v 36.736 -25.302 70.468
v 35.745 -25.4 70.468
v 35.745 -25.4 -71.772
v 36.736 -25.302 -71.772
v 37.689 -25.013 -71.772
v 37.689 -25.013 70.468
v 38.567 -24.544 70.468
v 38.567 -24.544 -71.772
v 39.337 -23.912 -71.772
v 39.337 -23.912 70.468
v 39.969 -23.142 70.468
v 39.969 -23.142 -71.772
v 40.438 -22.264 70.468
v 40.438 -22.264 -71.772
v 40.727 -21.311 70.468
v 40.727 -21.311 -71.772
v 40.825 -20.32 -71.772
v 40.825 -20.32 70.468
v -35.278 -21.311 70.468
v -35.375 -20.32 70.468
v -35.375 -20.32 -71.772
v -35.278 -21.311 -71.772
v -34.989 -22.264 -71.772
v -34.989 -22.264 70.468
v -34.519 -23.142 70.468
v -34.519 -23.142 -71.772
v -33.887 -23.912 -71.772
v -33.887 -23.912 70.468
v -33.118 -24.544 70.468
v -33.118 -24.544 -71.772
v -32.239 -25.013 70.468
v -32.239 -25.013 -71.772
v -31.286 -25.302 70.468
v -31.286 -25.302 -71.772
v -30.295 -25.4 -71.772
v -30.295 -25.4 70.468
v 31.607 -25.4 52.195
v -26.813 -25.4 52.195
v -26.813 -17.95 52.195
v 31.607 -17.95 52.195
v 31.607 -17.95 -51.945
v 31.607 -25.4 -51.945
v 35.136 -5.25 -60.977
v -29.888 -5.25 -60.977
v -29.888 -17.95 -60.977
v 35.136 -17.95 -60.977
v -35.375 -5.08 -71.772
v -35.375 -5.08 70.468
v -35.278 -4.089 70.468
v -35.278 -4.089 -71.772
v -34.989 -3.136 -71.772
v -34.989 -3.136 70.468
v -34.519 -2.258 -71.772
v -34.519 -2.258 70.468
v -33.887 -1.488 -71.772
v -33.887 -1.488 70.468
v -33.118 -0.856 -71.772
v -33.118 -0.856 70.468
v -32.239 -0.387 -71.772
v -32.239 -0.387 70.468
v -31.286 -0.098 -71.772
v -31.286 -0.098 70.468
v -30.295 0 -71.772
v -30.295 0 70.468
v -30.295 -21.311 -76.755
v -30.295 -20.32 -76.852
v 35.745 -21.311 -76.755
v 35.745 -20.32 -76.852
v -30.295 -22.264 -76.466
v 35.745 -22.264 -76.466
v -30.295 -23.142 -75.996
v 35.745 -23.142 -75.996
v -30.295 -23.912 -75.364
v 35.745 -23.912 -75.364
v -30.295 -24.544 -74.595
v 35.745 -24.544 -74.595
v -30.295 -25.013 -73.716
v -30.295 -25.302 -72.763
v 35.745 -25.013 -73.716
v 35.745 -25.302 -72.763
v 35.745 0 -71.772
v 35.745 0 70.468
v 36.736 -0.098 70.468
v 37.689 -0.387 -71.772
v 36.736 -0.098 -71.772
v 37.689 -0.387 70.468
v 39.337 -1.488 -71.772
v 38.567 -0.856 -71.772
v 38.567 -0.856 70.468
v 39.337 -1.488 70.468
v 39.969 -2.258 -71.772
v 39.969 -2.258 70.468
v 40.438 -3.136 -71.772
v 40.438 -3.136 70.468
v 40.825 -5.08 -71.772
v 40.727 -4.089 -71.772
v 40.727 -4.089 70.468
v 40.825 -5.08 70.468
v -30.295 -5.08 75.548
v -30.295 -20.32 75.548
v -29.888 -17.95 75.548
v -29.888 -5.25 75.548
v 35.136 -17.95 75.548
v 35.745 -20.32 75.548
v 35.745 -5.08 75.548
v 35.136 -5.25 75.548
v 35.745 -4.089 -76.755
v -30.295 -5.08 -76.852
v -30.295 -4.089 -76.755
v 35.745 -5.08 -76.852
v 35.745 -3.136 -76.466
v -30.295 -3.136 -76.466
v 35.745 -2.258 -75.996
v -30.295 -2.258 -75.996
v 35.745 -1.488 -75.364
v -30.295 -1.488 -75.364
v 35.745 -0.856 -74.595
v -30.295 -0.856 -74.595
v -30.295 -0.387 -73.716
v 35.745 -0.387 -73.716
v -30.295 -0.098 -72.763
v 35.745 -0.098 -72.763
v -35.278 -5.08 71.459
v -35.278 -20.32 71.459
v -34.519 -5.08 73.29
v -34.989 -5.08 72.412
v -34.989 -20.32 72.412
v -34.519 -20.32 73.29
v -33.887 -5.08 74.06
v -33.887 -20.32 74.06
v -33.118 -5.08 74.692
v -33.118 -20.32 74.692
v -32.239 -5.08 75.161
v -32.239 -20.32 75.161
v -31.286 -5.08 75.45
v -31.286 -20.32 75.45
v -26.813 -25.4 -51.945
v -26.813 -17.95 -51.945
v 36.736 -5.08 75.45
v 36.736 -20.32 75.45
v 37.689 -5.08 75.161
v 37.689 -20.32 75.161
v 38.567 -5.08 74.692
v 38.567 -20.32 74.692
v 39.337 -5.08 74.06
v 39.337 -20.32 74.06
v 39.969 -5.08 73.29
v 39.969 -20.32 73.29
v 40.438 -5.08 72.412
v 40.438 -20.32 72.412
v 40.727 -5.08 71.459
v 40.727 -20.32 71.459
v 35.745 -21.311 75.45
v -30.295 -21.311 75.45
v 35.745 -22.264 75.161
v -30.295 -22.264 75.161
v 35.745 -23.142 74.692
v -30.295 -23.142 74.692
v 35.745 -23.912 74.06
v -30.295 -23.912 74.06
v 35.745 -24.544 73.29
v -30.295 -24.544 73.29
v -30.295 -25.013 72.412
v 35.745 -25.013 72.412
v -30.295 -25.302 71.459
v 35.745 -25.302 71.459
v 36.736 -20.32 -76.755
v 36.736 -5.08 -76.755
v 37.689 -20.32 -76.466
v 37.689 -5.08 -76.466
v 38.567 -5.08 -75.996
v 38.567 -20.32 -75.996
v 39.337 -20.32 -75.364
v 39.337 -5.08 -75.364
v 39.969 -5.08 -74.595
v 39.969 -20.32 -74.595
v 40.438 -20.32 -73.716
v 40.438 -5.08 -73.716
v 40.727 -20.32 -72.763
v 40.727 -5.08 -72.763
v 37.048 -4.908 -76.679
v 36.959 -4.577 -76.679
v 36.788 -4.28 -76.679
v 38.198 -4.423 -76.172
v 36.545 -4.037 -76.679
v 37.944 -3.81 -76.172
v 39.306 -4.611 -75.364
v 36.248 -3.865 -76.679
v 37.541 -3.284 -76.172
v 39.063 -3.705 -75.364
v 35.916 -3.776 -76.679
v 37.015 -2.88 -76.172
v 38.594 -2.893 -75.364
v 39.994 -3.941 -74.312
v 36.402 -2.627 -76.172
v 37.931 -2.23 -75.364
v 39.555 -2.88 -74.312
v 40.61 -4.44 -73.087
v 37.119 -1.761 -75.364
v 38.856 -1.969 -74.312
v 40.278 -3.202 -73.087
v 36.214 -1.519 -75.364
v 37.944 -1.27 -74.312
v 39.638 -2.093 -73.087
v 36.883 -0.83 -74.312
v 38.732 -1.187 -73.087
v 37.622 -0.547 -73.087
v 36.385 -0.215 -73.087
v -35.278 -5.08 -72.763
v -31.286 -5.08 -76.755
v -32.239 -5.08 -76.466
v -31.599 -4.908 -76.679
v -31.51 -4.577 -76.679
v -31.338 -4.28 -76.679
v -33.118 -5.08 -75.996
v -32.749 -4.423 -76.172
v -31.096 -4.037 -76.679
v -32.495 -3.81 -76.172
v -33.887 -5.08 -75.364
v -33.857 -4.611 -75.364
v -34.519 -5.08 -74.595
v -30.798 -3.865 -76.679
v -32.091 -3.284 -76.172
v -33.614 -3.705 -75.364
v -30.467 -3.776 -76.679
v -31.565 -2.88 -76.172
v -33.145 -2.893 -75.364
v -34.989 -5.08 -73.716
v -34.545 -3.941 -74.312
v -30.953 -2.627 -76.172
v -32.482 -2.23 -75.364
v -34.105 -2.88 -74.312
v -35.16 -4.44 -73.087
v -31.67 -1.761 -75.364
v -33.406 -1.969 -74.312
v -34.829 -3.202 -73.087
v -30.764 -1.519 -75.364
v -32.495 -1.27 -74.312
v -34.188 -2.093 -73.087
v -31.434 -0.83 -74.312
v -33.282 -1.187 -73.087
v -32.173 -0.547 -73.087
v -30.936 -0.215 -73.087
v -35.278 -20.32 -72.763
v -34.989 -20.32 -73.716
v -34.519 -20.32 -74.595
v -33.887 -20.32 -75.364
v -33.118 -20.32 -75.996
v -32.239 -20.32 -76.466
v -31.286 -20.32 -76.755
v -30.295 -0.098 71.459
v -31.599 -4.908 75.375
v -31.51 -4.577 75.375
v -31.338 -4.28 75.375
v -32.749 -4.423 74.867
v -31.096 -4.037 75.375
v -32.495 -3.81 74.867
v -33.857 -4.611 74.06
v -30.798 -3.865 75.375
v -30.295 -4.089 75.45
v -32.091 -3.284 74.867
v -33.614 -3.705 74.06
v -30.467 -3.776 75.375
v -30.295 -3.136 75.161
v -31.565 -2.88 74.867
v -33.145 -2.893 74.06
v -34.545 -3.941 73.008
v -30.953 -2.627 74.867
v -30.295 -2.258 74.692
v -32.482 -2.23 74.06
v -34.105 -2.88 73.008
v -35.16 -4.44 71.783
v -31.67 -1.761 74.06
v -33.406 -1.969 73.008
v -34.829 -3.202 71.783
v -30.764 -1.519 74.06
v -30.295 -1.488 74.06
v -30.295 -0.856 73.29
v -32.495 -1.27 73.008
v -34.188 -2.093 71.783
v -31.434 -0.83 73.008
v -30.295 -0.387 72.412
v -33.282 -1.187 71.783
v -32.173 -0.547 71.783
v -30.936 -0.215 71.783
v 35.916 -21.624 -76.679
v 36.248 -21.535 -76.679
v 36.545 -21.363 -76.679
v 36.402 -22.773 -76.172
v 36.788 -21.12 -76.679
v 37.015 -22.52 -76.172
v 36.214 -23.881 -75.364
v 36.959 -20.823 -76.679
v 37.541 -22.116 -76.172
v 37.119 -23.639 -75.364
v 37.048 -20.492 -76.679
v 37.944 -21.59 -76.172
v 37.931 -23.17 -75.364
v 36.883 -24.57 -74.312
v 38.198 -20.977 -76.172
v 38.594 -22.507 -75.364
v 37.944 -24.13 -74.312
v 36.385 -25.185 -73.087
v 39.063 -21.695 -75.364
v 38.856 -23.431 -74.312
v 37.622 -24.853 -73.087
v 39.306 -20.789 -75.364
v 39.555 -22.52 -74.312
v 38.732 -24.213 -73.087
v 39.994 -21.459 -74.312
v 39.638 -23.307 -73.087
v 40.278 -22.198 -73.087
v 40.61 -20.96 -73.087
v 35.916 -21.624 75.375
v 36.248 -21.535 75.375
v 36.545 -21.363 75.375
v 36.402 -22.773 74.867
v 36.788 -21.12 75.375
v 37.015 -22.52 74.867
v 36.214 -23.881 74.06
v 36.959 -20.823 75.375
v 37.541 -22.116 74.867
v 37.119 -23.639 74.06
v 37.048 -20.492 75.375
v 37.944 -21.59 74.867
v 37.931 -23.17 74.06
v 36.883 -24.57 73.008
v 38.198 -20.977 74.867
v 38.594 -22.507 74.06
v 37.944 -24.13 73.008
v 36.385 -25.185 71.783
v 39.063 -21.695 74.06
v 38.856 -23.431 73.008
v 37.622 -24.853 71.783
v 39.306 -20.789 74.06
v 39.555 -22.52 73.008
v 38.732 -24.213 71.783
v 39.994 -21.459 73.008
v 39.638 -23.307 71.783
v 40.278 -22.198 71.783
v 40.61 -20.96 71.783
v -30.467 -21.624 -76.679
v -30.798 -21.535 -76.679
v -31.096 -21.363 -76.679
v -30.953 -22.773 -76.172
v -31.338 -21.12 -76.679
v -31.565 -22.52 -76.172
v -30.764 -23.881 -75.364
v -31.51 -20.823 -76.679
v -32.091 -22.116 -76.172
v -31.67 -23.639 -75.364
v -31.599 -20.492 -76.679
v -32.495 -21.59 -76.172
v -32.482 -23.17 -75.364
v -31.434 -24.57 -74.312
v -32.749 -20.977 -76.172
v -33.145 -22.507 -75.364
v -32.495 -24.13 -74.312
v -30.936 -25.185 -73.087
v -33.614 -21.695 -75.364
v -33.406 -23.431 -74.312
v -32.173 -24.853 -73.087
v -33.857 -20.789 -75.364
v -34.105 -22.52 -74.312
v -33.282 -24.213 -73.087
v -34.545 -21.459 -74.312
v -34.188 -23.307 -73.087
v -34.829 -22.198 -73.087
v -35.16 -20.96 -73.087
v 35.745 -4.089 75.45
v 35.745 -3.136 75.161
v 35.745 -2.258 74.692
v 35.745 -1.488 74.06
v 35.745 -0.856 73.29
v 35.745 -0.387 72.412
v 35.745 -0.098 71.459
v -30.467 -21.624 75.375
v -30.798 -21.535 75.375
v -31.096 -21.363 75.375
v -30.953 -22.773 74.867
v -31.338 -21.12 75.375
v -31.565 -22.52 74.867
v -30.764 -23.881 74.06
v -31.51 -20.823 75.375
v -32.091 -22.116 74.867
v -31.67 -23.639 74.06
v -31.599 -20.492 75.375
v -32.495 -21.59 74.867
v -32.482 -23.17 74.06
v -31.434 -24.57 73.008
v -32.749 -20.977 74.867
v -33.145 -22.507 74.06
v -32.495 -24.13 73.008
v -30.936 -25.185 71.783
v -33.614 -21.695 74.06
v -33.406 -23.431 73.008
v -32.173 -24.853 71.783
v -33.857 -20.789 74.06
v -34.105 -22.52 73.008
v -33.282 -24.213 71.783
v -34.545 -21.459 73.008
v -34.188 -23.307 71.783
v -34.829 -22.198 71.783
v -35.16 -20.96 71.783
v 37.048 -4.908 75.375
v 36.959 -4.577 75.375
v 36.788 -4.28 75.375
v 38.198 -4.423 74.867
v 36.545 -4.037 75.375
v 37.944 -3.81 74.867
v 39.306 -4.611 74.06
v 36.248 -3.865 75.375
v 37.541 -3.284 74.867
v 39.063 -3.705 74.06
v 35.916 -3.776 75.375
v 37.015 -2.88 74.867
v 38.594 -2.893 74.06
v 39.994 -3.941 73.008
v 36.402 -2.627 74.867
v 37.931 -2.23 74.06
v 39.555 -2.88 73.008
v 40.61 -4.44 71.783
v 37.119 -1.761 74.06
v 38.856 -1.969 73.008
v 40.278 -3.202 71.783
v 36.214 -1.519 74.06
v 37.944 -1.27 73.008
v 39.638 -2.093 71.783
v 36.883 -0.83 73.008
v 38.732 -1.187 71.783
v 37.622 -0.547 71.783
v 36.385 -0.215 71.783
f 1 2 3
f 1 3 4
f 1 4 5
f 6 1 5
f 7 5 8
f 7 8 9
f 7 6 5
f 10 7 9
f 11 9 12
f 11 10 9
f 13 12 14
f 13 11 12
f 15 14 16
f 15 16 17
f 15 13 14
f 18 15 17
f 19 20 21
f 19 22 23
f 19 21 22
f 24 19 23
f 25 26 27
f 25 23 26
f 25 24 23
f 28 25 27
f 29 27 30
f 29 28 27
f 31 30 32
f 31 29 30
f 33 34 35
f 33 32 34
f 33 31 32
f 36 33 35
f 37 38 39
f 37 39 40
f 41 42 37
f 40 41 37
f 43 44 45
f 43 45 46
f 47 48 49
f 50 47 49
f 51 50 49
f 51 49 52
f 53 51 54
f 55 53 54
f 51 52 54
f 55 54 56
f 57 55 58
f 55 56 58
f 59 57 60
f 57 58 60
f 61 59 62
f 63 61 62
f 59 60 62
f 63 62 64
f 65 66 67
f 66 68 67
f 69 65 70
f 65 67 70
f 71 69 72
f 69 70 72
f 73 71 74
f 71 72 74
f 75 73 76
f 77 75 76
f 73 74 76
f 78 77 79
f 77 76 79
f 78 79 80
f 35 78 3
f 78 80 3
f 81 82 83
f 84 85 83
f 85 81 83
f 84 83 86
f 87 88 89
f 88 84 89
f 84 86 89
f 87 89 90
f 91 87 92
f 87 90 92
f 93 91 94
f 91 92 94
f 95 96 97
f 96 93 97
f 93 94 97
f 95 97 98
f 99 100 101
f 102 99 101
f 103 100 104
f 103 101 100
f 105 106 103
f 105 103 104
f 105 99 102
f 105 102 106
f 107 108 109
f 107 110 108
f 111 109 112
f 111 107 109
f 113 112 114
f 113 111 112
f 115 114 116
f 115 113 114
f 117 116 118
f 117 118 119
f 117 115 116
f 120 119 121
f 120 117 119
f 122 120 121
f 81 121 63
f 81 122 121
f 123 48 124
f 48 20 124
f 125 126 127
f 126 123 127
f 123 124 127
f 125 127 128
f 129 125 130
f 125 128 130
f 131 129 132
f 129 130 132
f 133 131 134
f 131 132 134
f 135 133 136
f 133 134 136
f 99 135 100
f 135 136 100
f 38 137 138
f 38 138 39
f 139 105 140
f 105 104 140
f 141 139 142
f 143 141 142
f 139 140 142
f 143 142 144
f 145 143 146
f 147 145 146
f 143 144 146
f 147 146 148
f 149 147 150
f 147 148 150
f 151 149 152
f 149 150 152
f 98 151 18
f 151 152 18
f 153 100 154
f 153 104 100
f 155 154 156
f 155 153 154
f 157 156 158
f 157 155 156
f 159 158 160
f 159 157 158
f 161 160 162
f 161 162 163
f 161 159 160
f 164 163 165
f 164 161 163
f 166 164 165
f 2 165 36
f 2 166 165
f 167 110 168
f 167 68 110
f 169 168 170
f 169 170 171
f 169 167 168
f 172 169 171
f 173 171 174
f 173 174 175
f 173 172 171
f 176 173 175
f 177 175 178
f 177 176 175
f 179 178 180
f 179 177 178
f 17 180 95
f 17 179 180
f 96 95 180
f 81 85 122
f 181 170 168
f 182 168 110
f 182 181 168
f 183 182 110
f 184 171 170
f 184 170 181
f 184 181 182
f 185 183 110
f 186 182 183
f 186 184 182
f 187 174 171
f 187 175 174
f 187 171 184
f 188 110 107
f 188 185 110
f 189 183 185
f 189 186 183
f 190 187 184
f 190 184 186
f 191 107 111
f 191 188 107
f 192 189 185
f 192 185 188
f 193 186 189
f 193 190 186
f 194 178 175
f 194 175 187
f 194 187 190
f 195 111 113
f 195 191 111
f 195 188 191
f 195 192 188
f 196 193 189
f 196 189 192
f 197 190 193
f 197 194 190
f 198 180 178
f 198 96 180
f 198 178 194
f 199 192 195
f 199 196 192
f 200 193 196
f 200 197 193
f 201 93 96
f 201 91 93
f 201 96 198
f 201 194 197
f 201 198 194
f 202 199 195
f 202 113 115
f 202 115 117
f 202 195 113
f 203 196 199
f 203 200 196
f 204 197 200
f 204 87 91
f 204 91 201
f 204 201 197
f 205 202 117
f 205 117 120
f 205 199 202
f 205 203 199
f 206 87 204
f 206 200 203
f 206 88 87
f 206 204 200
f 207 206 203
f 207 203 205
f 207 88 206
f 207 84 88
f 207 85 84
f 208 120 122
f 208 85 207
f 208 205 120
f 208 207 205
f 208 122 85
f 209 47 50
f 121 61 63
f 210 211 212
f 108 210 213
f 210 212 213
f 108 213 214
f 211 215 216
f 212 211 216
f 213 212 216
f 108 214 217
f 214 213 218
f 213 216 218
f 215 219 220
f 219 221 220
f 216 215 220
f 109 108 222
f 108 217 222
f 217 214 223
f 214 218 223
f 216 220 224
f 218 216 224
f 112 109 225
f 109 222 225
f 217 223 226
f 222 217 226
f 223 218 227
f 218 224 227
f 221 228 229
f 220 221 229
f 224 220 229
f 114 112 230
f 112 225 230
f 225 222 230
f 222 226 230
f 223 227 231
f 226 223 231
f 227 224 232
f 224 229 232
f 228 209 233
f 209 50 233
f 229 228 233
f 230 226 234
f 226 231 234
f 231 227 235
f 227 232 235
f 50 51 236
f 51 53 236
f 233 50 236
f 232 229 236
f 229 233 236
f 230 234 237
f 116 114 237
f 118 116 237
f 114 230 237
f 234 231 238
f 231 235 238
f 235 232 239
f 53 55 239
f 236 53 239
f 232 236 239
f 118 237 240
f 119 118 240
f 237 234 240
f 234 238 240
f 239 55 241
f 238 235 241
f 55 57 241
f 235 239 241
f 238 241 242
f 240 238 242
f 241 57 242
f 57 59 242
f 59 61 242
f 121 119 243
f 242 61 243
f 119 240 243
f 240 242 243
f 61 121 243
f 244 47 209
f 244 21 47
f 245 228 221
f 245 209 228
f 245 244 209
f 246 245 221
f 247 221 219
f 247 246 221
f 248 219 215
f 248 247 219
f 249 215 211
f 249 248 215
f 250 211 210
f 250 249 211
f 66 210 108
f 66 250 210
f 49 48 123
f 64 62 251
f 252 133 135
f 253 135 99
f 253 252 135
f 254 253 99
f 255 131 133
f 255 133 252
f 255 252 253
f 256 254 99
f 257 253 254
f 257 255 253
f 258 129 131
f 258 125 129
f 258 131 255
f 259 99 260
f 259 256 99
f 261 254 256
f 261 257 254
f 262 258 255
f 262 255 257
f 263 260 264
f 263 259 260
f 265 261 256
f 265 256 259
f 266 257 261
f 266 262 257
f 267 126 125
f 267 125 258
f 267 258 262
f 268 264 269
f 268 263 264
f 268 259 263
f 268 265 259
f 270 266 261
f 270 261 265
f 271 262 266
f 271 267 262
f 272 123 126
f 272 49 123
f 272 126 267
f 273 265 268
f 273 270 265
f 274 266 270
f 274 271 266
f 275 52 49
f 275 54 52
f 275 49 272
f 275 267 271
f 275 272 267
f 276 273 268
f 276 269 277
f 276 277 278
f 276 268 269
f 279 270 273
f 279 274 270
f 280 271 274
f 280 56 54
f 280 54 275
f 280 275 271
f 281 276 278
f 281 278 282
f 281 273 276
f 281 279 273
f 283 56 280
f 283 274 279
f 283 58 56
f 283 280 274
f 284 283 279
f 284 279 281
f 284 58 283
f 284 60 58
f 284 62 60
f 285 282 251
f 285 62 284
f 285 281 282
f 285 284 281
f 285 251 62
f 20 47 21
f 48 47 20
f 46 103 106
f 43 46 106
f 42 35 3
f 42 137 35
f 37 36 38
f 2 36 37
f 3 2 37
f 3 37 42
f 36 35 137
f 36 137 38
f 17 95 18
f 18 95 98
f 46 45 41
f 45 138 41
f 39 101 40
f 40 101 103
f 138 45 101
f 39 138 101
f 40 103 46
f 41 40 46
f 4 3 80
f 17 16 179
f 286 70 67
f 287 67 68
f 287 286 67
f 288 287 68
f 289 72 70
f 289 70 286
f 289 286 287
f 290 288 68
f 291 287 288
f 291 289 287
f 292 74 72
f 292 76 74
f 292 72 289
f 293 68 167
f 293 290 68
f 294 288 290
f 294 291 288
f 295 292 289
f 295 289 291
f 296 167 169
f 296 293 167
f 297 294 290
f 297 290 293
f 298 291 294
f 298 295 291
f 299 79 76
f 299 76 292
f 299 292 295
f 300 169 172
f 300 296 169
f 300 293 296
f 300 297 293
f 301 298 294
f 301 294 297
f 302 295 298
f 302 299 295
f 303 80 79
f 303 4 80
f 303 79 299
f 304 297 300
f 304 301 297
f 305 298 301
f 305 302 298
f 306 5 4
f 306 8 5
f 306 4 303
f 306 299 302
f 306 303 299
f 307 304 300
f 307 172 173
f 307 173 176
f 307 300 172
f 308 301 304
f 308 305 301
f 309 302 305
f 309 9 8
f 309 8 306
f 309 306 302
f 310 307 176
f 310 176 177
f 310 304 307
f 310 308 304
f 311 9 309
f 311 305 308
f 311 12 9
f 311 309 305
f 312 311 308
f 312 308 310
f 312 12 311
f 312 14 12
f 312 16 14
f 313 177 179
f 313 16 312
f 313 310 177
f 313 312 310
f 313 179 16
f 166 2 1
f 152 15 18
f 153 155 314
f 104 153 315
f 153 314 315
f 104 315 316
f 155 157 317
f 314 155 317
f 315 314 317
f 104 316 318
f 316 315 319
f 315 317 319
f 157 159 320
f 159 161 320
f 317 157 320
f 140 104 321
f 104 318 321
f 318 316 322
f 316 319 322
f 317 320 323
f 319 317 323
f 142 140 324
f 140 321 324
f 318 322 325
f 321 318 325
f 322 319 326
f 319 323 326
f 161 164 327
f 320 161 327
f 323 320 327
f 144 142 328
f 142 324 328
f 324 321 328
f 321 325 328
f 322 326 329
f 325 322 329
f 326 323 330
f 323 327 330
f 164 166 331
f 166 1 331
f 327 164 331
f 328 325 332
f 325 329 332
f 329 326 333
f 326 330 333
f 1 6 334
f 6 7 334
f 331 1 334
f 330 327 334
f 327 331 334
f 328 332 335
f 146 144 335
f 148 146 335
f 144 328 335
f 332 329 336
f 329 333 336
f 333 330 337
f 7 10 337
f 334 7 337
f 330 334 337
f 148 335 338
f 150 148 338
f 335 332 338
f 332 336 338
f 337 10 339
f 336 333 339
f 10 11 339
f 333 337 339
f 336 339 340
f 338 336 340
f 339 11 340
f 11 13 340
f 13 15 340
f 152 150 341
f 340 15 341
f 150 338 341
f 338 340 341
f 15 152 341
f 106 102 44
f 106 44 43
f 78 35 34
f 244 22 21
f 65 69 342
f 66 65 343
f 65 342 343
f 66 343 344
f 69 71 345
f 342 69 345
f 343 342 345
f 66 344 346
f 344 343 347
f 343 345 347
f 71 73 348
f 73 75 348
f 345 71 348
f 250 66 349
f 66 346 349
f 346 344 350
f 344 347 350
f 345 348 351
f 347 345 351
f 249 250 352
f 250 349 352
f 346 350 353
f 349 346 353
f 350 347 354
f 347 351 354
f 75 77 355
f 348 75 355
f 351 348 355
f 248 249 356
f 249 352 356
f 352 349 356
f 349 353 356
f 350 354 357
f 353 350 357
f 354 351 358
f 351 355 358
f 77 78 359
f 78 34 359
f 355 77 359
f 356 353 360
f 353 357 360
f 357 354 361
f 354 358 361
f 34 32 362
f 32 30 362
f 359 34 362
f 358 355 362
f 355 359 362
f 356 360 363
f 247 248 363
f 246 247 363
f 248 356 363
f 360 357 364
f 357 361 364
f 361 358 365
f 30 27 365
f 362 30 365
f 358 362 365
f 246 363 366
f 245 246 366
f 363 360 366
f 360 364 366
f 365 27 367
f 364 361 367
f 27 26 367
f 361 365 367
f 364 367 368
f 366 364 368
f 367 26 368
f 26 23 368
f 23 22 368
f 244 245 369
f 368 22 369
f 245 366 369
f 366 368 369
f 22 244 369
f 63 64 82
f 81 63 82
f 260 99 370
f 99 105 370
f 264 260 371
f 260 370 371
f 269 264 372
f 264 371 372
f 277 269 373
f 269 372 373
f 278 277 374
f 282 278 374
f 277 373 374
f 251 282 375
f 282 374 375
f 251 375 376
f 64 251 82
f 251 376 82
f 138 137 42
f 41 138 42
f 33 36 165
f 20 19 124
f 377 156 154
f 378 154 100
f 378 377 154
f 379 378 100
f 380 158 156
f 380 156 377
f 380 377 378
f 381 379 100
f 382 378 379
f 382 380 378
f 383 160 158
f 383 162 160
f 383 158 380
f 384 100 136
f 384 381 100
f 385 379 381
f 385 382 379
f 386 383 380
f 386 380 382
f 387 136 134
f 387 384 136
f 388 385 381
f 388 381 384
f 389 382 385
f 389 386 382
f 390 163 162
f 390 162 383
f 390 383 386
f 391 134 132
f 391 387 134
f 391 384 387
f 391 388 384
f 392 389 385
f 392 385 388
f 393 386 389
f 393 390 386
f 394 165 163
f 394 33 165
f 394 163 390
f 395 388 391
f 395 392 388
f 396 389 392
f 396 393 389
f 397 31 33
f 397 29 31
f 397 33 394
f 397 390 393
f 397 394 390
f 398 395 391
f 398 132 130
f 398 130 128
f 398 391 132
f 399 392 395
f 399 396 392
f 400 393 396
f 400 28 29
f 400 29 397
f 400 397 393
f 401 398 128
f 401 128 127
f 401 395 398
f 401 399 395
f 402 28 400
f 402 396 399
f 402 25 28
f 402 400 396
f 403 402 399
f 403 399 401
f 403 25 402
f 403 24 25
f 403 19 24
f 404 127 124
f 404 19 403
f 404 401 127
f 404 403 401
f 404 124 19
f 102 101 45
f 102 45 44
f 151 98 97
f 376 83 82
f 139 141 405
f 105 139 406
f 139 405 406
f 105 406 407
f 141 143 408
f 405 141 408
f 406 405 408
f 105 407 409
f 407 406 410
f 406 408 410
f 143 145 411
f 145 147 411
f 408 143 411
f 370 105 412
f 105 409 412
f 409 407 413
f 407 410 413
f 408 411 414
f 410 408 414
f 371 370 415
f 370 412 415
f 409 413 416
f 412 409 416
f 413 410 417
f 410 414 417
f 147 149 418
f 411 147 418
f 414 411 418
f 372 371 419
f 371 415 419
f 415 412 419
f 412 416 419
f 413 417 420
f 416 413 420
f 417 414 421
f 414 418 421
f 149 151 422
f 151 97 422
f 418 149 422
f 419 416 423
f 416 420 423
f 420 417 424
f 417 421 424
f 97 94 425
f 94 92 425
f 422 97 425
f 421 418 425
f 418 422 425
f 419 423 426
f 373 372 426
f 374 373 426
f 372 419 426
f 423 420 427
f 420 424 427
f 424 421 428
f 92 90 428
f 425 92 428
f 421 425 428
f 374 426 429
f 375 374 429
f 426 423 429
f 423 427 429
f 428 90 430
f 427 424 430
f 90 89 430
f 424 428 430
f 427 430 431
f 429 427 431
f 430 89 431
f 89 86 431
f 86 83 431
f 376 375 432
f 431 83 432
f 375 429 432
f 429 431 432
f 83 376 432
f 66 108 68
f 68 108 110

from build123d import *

# Parameters (mm, degrees)
F0_W     = 76.2
F0_H     = 152.4
F1_DEPTH = 25.4
F2_W     = 65.024
F2_H     = 12.7
F3_DEPTH = 136.525
F4_R     = 5.08
F5_W     = 58.42
F5_H     = 104.14
F6_DEPTH = 7.62


with BuildPart() as f1:
    # F0 (on Front) → F1 (new body)
    with BuildSketch(Plane.XZ):
        with Locations((2.724684, -0.652284)):
            Rectangle(F0_W, F0_H)
    extrude(amount=F1_DEPTH)

    # F2 (on face) → F3 (cut)
    with BuildSketch(Plane.XY.offset(75.547716)):
        with Locations((2.623657, -11.599738)):
            Rectangle(F2_W, F2_H)
    extrude(amount=-F3_DEPTH, mode=Mode.SUBTRACT)

    # F4
    f4_edges = [f1.edges().sort_by_distance(p)[0] for p in [
        (40.824684, -25.4, -0.652284),
        (40.824684, 0, -0.652284),
        (-35.375316, 0, -0.652284),
        (-35.375316, -25.4, -0.652284),
        (2.724684, -25.4, -76.852284),
        (-35.375316, -12.7, -76.852284),
        (40.824684, -12.7, -76.852284),
        (2.724684, 0, -76.852284),
        (2.724684, -25.4, 75.547716),
        (-35.375316, -12.7, 75.547716),
        (40.824684, -12.7, 75.547716),
        (2.724684, 0, 75.547716),
    ]]
    fillet(f4_edges, radius=F4_R)

    # F5 (on face) → F6 (cut)
    with BuildSketch(Plane.XZ.offset(25.4)):
        with Locations((2.397154, 0.125338)):
            Rectangle(F5_W, F5_H)
    extrude(amount=-F6_DEPTH, mode=Mode.SUBTRACT)


solid = f1.part
